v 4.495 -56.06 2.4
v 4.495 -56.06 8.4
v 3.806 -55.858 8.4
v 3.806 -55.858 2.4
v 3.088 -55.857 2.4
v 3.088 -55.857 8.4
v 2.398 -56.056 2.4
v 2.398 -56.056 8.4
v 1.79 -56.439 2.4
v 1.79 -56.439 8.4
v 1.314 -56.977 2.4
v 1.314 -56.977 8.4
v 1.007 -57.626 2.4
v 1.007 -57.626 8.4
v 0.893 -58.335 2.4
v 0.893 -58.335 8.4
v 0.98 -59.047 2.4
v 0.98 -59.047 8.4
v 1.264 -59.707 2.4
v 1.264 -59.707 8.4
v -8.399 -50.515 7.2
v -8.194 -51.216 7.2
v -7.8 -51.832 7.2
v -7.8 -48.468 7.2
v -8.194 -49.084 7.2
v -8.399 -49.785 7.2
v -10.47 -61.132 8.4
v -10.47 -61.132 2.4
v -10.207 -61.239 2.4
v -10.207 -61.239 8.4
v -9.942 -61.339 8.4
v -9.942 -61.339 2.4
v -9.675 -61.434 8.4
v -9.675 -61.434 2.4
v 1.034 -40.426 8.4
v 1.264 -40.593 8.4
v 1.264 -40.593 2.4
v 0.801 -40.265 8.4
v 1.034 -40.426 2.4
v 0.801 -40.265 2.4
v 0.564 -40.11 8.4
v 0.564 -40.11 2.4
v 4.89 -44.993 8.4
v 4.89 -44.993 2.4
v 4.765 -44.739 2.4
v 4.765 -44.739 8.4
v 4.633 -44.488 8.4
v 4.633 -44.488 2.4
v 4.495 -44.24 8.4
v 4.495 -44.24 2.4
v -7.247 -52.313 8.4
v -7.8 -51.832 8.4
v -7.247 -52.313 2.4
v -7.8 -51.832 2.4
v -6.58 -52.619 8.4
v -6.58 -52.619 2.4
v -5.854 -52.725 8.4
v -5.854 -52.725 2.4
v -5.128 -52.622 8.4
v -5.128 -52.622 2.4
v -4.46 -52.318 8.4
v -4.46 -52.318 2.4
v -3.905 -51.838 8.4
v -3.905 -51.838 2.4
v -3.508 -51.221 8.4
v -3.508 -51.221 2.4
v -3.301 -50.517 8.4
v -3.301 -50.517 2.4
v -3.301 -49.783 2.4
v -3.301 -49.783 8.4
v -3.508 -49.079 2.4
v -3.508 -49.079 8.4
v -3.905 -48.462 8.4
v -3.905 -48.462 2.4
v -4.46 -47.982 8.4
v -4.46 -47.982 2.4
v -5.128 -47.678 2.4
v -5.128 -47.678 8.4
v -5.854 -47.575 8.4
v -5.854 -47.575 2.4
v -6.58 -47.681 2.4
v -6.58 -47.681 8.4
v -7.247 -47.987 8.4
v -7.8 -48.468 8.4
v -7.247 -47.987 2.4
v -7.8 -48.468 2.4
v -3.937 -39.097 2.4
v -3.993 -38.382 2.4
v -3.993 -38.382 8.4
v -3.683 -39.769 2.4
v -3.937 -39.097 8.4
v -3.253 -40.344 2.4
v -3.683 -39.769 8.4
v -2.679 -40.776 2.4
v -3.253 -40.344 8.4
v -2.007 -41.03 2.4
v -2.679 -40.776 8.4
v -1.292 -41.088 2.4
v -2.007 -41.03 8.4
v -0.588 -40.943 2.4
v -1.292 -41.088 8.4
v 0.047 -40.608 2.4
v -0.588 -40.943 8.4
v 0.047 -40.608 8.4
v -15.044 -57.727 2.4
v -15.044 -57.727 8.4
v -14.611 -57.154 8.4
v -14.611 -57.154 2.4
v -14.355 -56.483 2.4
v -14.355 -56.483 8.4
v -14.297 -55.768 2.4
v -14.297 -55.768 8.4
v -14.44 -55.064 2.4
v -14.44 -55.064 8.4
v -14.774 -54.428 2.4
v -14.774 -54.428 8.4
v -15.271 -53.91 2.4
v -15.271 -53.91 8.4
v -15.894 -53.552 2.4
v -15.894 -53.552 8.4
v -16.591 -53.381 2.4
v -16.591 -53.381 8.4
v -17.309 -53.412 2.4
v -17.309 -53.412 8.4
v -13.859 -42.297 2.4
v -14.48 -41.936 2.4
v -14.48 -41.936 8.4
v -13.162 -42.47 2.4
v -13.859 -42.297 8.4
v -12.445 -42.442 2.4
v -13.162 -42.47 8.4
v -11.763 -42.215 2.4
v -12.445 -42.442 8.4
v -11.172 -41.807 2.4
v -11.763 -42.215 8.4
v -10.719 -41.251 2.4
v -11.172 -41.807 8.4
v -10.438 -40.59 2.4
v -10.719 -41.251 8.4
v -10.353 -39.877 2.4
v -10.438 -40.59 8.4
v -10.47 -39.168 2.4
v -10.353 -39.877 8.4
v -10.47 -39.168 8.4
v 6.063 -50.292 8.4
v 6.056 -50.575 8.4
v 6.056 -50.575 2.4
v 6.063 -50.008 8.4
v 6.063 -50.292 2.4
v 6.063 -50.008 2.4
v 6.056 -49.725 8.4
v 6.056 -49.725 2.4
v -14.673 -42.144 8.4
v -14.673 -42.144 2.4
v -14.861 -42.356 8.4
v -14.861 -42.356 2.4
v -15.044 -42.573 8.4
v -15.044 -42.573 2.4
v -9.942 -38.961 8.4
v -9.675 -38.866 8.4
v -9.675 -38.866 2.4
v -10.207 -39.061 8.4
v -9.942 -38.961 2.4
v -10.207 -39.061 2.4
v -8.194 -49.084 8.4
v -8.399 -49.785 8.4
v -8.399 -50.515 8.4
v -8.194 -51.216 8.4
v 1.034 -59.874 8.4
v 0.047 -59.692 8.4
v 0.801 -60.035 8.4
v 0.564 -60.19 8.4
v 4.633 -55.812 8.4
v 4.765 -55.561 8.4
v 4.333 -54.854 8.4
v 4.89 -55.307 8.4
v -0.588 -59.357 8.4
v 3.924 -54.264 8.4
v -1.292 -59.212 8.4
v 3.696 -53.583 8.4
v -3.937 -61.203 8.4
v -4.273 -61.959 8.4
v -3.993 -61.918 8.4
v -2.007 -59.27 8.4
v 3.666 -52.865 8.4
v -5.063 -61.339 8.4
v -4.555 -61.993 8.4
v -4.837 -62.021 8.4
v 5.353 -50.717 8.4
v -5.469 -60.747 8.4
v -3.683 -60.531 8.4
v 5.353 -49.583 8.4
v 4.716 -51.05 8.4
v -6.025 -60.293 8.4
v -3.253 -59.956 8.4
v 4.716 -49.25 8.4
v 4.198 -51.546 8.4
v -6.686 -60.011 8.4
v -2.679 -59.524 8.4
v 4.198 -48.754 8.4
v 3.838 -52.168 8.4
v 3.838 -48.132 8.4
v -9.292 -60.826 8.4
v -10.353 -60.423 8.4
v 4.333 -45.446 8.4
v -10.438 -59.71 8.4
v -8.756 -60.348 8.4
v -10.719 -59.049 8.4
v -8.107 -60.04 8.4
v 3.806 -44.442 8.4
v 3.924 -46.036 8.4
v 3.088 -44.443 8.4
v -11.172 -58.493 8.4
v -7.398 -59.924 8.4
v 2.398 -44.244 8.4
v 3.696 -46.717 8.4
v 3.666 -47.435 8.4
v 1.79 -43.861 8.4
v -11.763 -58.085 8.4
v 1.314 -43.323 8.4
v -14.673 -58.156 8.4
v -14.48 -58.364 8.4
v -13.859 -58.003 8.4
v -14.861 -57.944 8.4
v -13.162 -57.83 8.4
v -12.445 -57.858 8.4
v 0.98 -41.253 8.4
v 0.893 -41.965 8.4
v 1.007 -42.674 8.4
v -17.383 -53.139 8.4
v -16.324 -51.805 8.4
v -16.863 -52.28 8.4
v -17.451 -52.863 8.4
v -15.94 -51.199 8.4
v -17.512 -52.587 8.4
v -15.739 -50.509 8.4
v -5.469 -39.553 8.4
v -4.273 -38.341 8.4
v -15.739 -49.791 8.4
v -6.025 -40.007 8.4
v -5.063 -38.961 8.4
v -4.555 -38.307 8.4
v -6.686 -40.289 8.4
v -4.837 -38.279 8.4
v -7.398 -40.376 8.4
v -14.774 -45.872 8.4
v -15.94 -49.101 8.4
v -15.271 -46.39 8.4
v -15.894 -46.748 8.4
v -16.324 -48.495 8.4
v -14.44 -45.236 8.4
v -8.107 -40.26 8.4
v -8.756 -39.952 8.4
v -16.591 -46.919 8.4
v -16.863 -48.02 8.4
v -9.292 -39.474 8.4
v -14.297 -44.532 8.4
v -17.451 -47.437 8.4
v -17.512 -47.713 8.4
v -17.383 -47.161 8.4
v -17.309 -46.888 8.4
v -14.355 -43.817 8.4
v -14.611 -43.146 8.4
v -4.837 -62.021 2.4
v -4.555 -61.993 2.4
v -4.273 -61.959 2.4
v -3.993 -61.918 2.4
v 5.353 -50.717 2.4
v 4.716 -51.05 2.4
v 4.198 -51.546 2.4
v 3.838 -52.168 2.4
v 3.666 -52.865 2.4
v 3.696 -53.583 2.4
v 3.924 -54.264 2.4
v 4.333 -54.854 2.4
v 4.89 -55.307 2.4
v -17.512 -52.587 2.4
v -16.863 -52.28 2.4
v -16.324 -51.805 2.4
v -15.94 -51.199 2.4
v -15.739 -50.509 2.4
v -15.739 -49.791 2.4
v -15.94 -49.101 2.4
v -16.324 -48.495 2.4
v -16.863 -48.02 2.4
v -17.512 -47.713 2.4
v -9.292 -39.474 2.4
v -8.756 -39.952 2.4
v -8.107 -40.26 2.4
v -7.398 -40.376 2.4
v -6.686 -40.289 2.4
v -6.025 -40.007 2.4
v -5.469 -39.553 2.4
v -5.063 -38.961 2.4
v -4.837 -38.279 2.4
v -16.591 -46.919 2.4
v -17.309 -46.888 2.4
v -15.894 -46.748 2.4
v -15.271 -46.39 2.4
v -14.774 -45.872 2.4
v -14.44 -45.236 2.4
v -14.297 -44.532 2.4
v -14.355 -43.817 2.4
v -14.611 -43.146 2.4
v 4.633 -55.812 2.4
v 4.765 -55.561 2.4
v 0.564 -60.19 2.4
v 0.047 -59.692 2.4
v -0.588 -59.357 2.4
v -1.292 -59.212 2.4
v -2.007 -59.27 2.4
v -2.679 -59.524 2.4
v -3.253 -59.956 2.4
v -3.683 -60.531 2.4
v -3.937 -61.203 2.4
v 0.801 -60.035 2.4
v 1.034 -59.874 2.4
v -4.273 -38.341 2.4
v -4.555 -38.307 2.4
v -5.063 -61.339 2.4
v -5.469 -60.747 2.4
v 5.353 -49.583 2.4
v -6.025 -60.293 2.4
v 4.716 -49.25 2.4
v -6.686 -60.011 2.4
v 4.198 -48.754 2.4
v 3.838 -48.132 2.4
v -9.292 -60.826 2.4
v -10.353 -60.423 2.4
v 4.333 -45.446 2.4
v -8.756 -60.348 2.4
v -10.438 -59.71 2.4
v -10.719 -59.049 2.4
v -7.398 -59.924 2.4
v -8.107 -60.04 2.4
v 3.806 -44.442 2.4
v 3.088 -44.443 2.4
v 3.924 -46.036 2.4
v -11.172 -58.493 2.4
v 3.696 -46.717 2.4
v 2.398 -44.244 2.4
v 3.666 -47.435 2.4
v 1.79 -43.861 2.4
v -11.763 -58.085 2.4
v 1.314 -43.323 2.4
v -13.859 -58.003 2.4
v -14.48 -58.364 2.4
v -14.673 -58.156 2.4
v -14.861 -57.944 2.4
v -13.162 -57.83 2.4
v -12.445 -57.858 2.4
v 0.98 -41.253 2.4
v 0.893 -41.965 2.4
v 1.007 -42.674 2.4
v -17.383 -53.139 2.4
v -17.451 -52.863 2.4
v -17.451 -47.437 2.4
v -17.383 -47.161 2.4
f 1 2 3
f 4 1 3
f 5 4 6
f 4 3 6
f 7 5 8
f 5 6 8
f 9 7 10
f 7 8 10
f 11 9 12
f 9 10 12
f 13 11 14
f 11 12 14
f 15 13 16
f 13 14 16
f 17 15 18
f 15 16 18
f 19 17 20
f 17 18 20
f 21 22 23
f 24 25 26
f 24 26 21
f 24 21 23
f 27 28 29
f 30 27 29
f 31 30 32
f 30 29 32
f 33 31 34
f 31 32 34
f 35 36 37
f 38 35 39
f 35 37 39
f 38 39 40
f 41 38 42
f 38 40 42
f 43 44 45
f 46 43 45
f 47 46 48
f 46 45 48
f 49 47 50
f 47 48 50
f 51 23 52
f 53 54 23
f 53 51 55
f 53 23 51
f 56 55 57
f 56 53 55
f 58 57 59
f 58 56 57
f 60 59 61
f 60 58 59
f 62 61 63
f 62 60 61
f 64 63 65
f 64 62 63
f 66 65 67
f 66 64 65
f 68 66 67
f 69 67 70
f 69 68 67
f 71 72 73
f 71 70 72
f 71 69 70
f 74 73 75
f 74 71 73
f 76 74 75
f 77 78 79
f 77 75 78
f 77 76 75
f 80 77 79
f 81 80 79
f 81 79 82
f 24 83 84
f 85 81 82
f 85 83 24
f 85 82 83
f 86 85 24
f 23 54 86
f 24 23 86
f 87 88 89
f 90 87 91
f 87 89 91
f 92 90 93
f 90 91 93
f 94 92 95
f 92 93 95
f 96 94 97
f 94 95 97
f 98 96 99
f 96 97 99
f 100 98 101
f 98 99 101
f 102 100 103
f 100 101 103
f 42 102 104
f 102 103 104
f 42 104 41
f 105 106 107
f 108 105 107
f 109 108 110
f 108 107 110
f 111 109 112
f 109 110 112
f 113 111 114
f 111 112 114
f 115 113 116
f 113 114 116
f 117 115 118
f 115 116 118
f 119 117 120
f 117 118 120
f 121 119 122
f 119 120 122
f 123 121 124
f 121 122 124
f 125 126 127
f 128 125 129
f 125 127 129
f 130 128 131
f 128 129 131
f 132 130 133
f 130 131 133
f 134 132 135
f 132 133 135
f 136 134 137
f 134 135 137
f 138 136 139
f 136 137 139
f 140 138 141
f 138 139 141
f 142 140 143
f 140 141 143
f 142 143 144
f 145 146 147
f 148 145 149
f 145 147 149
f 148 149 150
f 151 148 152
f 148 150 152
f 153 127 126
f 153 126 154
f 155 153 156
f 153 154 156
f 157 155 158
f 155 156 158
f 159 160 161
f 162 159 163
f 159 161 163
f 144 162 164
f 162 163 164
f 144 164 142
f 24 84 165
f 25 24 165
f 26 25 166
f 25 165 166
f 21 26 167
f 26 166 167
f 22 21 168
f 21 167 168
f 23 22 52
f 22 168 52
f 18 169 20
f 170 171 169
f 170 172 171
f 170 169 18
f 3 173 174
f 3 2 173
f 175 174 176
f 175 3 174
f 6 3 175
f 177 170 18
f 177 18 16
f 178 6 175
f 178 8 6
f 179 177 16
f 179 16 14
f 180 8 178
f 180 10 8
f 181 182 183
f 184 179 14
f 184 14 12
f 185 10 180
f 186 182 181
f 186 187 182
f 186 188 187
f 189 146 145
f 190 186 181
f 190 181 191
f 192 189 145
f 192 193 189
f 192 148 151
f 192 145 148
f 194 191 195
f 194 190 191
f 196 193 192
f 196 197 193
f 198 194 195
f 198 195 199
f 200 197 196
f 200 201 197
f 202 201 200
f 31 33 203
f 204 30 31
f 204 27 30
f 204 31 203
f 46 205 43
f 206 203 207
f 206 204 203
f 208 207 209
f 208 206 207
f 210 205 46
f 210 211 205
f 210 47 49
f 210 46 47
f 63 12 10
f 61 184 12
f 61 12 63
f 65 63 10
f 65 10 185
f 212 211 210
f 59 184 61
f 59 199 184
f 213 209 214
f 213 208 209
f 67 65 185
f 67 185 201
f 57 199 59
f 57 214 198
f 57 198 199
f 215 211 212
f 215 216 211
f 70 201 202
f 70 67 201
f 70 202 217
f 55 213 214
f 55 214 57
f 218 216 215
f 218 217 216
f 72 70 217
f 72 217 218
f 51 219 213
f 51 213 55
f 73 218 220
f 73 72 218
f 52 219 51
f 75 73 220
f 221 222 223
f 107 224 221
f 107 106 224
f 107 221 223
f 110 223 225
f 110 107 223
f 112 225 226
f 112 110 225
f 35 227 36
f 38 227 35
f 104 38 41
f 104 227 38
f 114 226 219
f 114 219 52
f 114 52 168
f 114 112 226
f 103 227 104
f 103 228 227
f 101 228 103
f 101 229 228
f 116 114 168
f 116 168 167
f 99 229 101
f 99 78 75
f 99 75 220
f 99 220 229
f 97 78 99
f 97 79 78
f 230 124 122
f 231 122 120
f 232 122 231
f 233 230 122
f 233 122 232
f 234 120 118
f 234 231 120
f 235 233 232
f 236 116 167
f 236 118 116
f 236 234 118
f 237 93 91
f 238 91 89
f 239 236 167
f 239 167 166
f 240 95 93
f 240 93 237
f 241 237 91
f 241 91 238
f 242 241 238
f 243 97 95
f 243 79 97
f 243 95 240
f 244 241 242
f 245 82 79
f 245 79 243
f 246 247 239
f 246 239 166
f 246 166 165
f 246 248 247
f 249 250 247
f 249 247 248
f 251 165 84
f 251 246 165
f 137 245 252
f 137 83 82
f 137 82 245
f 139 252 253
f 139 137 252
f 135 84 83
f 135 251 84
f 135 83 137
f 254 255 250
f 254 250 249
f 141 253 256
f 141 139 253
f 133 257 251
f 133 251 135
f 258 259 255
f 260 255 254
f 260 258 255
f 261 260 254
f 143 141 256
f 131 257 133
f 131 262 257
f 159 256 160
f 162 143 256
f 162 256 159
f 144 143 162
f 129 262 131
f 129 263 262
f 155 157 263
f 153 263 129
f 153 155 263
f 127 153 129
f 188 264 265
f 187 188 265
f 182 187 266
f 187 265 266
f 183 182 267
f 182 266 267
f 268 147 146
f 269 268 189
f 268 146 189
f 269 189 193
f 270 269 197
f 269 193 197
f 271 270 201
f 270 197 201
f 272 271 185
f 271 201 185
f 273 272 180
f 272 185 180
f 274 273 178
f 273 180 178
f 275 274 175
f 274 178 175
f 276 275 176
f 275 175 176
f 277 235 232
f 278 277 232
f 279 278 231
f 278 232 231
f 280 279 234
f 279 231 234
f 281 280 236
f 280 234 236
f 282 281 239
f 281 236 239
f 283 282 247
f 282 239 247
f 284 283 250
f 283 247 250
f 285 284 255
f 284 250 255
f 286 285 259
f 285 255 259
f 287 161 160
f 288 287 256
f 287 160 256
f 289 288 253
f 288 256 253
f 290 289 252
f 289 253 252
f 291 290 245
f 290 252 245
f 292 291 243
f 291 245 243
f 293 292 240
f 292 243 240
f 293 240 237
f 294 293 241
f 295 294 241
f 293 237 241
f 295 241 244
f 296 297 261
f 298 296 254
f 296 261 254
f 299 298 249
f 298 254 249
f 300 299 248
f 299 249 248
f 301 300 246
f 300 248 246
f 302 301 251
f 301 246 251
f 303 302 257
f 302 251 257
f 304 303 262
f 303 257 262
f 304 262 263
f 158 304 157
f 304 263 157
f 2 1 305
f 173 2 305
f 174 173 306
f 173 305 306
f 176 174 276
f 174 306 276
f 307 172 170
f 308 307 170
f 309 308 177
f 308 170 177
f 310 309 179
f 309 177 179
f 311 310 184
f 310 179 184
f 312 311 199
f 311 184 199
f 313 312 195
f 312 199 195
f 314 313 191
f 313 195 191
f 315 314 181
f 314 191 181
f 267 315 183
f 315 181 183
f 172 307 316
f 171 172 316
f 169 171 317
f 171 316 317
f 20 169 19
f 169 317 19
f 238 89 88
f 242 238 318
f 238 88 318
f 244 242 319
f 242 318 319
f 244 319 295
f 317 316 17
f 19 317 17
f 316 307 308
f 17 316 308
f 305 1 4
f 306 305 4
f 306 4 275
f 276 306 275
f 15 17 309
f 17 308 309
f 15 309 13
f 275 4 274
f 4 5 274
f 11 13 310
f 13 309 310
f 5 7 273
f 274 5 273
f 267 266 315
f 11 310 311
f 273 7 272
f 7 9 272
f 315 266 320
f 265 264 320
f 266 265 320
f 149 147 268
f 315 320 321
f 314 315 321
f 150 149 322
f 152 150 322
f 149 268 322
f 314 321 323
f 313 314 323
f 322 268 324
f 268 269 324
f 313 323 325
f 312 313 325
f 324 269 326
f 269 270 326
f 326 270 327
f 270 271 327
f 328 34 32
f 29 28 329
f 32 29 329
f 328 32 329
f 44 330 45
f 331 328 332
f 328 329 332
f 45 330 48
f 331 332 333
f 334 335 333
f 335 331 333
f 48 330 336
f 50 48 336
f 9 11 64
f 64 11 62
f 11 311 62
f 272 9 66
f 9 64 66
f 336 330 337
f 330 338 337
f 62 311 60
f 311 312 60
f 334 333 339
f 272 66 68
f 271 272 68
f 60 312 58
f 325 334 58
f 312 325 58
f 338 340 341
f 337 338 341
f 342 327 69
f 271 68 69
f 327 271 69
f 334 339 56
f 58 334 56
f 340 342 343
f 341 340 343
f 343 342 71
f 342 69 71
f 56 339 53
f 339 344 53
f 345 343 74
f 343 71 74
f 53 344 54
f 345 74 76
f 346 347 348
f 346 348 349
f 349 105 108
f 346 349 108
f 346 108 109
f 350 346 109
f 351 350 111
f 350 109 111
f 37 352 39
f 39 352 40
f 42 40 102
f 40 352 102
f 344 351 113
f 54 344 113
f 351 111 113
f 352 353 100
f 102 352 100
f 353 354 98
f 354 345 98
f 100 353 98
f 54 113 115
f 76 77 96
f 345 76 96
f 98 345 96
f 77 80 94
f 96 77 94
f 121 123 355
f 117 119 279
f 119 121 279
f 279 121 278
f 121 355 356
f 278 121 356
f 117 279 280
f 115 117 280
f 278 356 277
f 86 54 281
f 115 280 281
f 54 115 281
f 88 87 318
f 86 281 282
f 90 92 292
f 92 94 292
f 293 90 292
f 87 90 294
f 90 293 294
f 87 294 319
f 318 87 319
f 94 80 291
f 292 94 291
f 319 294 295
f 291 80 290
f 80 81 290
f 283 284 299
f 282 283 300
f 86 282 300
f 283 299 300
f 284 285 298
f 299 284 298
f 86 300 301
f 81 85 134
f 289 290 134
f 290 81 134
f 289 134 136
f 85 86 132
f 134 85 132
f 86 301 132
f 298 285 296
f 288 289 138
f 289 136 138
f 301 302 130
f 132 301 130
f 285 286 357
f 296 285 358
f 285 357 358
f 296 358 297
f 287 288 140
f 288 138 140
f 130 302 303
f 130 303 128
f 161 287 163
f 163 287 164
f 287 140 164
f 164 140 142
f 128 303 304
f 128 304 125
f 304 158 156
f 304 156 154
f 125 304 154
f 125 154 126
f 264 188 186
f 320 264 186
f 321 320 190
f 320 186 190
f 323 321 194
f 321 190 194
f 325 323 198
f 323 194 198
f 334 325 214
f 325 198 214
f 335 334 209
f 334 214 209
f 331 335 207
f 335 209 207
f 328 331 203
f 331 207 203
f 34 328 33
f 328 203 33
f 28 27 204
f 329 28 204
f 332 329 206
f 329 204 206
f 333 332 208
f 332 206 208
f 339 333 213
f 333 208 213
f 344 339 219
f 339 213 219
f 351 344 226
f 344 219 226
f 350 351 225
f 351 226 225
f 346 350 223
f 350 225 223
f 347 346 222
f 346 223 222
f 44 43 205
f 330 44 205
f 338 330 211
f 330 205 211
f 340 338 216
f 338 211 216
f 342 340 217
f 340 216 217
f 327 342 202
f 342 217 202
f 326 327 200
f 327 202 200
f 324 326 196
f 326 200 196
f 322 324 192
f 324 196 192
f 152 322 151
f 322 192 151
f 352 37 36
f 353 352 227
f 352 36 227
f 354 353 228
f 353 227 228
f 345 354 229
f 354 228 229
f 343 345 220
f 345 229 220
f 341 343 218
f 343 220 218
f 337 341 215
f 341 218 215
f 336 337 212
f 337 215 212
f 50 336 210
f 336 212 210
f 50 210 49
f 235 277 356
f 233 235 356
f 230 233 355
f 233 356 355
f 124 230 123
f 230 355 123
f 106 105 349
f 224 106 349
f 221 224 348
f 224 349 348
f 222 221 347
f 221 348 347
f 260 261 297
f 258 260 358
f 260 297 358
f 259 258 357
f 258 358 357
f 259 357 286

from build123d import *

# Parameters (mm, degrees)
SKETCH003_R             = 11.914086
PAD001_DEPTH            = 6
SKETCH004_R             = 2.55
POCKET001_DEPTH         = 74.457219
POLARPATTERN_COUNT      = 13
SKETCH062_R             = 2.575
POCKET014_DEPTH         = 1.2
BODY001_PLACEMENT_ANGLE = 90


with BuildPart() as part:
    # Sketch003 → Pad001 (new body)
    with BuildSketch(Plane.XY):
        Circle(SKETCH003_R)
        with BuildLine():
            ThreePointArc((-1.681703, 1.95), (0, -2.575), (1.681703, 1.95))
            Line((-1.681703, 1.95), (1.681703, 1.95))
        make_face(mode=Mode.SUBTRACT)
    extrude(amount=PAD001_DEPTH)

    # Sketch004 (on Face5 of Pad001) → Pocket001 (cut, through all)
    with BuildSketch(Plane.XY.offset(6)):
        with Locations((0, 12.414086)):
            Circle(SKETCH004_R)
    pocket001 = extrude(amount=-POCKET001_DEPTH, mode=Mode.SUBTRACT)

    # PolarPattern: Pocket001 ×13 about axis
    polarpattern_axis = Axis((0, 0, 6), (0, 0, 1))
    for i in range(1, POLARPATTERN_COUNT):
        add(pocket001.rotate(polarpattern_axis, i * 360 / POLARPATTERN_COUNT), mode=Mode.SUBTRACT)

    # Sketch062 (on Face4 of PolarPattern) → Pocket014 (cut)
    with BuildSketch(Plane.XY.offset(6)):
        Circle(SKETCH062_R)
    extrude(amount=-POCKET014_DEPTH, mode=Mode.SUBTRACT)


with BuildPart() as part_1:
    # Body001 placement: moved
    add(part.part.moved(Location((-5.85, -50.15, 2.4))).rotate(Axis((-5.85, -50.15, 2.4), (0, 0, 1)), BODY001_PLACEMENT_ANGLE))


solid = part_1.part
